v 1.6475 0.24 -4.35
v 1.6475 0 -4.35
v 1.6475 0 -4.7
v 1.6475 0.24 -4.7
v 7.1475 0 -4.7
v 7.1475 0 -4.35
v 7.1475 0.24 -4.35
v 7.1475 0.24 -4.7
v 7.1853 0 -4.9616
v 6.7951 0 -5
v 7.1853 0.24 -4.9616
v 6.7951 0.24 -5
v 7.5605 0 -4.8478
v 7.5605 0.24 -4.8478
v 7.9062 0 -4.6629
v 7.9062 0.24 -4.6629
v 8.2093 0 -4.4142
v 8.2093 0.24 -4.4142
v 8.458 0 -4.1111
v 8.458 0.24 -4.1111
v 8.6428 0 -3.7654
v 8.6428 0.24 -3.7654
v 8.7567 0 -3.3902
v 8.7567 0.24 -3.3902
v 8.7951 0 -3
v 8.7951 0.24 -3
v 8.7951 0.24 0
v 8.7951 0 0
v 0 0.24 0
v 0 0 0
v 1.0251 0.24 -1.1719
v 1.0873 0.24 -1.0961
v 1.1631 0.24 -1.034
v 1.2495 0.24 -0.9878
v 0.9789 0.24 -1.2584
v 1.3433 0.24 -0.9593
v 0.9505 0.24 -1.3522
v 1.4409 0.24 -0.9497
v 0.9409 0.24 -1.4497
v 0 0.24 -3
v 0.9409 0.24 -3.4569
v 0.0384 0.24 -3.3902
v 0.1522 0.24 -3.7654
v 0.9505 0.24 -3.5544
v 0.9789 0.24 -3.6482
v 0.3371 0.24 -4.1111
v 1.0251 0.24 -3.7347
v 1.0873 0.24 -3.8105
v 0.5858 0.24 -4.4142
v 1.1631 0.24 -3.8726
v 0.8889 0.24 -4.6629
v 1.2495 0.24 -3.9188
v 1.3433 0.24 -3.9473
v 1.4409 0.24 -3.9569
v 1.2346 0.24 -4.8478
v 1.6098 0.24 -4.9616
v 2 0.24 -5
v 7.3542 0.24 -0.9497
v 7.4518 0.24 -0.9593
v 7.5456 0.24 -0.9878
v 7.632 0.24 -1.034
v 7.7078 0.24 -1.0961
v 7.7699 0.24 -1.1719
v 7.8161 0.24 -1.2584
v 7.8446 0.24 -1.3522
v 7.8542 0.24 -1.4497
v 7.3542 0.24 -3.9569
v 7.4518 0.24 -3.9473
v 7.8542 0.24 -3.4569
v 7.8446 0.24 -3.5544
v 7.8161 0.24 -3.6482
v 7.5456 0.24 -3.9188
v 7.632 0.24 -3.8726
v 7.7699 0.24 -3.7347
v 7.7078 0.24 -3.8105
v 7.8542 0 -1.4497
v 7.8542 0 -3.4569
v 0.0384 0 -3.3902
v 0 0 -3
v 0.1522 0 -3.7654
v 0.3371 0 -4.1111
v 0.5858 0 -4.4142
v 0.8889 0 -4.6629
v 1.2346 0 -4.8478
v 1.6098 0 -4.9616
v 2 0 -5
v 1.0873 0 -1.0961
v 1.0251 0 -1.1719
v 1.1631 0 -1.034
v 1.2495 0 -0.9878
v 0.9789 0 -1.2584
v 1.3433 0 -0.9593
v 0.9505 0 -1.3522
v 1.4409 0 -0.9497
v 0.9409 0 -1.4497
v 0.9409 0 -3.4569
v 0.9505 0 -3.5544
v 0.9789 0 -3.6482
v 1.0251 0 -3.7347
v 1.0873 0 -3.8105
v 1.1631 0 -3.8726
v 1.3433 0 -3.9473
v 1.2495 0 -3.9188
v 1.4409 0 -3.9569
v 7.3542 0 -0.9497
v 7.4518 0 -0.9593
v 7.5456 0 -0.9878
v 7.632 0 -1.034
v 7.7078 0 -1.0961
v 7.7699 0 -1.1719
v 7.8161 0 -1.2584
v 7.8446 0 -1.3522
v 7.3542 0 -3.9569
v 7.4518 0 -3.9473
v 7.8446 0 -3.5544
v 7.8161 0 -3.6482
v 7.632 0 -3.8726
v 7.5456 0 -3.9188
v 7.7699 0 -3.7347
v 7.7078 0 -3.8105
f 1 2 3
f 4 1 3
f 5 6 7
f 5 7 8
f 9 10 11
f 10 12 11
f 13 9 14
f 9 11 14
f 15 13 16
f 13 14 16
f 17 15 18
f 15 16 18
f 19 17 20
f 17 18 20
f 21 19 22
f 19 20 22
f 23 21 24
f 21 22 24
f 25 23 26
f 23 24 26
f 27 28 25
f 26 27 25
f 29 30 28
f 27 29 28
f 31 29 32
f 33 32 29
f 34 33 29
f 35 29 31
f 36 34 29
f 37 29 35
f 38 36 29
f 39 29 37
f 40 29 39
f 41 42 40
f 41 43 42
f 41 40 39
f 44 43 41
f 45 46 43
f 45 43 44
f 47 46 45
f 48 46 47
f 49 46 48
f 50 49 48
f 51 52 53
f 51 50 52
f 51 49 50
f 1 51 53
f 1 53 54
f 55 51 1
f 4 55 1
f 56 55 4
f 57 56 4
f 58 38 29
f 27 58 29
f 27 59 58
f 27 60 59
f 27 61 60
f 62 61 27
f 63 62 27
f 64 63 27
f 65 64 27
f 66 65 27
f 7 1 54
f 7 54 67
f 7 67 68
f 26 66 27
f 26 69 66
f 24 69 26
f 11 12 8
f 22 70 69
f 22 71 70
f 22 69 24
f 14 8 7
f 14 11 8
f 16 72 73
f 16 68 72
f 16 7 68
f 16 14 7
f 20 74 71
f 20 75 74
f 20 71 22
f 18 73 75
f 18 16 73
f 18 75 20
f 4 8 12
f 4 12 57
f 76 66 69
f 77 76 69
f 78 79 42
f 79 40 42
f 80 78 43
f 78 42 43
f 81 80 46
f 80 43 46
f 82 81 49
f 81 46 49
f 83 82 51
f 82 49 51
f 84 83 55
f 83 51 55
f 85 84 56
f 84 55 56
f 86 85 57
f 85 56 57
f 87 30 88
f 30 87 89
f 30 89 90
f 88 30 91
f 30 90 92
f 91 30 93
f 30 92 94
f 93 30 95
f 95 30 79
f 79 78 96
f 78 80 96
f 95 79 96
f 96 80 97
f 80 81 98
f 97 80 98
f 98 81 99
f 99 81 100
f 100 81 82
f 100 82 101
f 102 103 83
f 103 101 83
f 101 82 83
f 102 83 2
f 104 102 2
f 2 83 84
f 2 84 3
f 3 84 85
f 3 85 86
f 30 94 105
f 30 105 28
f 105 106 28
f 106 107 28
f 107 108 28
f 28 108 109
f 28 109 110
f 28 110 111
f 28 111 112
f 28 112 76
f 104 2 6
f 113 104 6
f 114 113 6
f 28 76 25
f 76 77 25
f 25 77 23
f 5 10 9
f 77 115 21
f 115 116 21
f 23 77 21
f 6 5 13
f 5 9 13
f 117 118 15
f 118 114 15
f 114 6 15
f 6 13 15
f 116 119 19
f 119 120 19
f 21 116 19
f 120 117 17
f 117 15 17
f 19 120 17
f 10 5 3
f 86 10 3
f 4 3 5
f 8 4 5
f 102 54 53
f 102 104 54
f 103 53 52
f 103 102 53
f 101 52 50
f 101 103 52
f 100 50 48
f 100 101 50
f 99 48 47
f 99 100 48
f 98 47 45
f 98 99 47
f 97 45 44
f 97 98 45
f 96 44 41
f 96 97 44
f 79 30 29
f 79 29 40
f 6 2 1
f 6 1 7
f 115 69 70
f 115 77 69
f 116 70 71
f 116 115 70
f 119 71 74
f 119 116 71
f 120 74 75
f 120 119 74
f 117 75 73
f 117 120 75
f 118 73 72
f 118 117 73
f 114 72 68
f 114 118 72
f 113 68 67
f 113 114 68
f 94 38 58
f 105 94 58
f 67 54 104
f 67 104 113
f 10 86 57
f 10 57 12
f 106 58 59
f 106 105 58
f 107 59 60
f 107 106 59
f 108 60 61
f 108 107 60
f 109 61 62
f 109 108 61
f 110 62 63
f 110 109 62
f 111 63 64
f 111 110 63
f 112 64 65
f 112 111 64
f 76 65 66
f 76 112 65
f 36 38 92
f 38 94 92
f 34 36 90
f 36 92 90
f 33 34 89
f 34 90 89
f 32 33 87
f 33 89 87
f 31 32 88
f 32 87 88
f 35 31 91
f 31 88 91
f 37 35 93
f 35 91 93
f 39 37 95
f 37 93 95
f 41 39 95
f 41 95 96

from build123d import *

# Parameters (mm, degrees)
SKETCH1_W           = 8.795086316
SKETCH1_H           = 5
SKETCH1_W_2         = 5.5
SKETCH1_H_2         = 0.35
BOSS_EXTRUDE1_DEPTH = 0.24
FILLET1_R           = 2
SKETCH2_W           = 6.913332482
SKETCH2_H           = 3.007207861
CUT_EXTRUDE1_DEPTH  = 11.119839095
FILLET4_R           = 0.5


with BuildPart() as part:
    # Sketch1 → Boss-Extrude1 (new body)
    with BuildSketch(Plane(origin=(0, 0, 0), x_dir=(1, 0, 0), z_dir=(0, 1, 0))):
        with Locations((4.397543158, 2.5)):
            Rectangle(SKETCH1_W, SKETCH1_H)
        with Locations((4.397543158, 4.525)):
            Rectangle(SKETCH1_W_2, SKETCH1_H_2, mode=Mode.SUBTRACT)
    extrude(amount=BOSS_EXTRUDE1_DEPTH)

    # Fillet1
    fillet1_edges = [part.edges().sort_by_distance(p)[0] for p in [
        (0, 0.12, -5),
        (8.795086316, 0.12, -5),
    ]]
    fillet(fillet1_edges, radius=FILLET1_R)

    # Sketch2 → Cut-Extrude1 (cut, through all)
    with BuildSketch(Plane(origin=(0, 0.24, 0), x_dir=(1, 0, 0), z_dir=(0, 1, 0))):
        with Locations((4.397543158, 2.453300335)):
            Rectangle(SKETCH2_W, SKETCH2_H)
    extrude(amount=-CUT_EXTRUDE1_DEPTH, mode=Mode.SUBTRACT)

    # Fillet4
    fillet4_edges = [part.edges().sort_by_distance(p)[0] for p in [
        (0.940876917, 0.12, -0.949696404),
        (0.940876917, 0.12, -3.956904265),
        (7.854209399, 0.12, -3.956904265),
        (7.854209399, 0.12, -0.949696404),
    ]]
    fillet(fillet4_edges, radius=FILLET4_R)


solid = part.part
